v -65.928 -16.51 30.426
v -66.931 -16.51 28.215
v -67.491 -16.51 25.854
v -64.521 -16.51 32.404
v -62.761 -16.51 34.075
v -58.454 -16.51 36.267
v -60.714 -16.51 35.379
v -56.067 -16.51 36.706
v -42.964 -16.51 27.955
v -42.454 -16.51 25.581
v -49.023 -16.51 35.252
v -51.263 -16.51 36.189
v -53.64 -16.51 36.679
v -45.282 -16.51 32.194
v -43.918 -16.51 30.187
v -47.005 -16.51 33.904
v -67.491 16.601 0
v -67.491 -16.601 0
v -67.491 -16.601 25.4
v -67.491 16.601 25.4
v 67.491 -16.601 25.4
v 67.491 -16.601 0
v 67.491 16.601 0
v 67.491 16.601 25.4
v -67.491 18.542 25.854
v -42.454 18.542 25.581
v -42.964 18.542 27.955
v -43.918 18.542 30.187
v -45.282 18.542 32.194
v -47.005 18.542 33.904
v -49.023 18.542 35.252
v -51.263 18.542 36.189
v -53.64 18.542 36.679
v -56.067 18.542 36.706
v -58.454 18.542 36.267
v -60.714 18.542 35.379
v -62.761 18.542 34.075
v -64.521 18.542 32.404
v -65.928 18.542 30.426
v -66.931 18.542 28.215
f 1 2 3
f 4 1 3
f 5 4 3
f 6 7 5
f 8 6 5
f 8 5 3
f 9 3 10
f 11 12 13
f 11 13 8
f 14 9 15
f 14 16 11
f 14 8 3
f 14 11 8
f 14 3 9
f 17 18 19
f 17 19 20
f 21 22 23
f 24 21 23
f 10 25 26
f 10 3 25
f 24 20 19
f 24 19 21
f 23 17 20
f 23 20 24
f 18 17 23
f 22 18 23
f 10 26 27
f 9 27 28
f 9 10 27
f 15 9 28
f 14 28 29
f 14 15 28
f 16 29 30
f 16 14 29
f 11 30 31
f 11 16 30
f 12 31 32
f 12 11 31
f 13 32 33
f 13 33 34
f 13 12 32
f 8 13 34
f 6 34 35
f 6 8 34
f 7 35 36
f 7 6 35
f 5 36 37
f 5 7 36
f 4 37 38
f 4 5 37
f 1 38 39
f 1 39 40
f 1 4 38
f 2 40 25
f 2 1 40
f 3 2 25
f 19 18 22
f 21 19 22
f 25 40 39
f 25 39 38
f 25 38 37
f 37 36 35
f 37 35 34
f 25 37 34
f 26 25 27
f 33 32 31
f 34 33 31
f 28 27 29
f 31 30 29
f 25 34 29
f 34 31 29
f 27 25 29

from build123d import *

# Parameters (mm, degrees)
F0_W     = 134.9828541279
F0_H     = 33.2014299929
F1_DEPTH = 25.4
F3_DEPTH = 16.51
F4_DEPTH = 18.542


# Not quite as in the source:
# - a feature of the source that left no trace in its solid (it failed there, or was rolled back) is left out


with BuildPart() as f1:
    # F0 (on Top) → F1 (new body)
    with BuildSketch(Plane.XY):
        Rectangle(F0_W, F0_H)
    extrude(amount=F1_DEPTH)


with BuildPart() as f3:
    # F2 (on Front) → F3 (new body)
    with BuildSketch(Plane.XZ):
        with BuildLine():
            Line((-67.4914270639, 25.8535724133), (-42.4542874098, 25.5814287812))
            ThreePointArc((-42.4542874098, 25.5814287812), (-54.8529271081, 36.7510396112), (-67.4914270639, 25.8535724133))
        make_face()
    extrude(amount=F3_DEPTH)

    # F4 (add): a face of the model
    f4_faces = [f3.faces().sort_by_distance(p)[0] for p in [
        (-54.9224588706, 0, 30.3541364957),
    ]]
    extrude(f4_faces, amount=F4_DEPTH)


solid = Compound([f1.part, f3.part])
